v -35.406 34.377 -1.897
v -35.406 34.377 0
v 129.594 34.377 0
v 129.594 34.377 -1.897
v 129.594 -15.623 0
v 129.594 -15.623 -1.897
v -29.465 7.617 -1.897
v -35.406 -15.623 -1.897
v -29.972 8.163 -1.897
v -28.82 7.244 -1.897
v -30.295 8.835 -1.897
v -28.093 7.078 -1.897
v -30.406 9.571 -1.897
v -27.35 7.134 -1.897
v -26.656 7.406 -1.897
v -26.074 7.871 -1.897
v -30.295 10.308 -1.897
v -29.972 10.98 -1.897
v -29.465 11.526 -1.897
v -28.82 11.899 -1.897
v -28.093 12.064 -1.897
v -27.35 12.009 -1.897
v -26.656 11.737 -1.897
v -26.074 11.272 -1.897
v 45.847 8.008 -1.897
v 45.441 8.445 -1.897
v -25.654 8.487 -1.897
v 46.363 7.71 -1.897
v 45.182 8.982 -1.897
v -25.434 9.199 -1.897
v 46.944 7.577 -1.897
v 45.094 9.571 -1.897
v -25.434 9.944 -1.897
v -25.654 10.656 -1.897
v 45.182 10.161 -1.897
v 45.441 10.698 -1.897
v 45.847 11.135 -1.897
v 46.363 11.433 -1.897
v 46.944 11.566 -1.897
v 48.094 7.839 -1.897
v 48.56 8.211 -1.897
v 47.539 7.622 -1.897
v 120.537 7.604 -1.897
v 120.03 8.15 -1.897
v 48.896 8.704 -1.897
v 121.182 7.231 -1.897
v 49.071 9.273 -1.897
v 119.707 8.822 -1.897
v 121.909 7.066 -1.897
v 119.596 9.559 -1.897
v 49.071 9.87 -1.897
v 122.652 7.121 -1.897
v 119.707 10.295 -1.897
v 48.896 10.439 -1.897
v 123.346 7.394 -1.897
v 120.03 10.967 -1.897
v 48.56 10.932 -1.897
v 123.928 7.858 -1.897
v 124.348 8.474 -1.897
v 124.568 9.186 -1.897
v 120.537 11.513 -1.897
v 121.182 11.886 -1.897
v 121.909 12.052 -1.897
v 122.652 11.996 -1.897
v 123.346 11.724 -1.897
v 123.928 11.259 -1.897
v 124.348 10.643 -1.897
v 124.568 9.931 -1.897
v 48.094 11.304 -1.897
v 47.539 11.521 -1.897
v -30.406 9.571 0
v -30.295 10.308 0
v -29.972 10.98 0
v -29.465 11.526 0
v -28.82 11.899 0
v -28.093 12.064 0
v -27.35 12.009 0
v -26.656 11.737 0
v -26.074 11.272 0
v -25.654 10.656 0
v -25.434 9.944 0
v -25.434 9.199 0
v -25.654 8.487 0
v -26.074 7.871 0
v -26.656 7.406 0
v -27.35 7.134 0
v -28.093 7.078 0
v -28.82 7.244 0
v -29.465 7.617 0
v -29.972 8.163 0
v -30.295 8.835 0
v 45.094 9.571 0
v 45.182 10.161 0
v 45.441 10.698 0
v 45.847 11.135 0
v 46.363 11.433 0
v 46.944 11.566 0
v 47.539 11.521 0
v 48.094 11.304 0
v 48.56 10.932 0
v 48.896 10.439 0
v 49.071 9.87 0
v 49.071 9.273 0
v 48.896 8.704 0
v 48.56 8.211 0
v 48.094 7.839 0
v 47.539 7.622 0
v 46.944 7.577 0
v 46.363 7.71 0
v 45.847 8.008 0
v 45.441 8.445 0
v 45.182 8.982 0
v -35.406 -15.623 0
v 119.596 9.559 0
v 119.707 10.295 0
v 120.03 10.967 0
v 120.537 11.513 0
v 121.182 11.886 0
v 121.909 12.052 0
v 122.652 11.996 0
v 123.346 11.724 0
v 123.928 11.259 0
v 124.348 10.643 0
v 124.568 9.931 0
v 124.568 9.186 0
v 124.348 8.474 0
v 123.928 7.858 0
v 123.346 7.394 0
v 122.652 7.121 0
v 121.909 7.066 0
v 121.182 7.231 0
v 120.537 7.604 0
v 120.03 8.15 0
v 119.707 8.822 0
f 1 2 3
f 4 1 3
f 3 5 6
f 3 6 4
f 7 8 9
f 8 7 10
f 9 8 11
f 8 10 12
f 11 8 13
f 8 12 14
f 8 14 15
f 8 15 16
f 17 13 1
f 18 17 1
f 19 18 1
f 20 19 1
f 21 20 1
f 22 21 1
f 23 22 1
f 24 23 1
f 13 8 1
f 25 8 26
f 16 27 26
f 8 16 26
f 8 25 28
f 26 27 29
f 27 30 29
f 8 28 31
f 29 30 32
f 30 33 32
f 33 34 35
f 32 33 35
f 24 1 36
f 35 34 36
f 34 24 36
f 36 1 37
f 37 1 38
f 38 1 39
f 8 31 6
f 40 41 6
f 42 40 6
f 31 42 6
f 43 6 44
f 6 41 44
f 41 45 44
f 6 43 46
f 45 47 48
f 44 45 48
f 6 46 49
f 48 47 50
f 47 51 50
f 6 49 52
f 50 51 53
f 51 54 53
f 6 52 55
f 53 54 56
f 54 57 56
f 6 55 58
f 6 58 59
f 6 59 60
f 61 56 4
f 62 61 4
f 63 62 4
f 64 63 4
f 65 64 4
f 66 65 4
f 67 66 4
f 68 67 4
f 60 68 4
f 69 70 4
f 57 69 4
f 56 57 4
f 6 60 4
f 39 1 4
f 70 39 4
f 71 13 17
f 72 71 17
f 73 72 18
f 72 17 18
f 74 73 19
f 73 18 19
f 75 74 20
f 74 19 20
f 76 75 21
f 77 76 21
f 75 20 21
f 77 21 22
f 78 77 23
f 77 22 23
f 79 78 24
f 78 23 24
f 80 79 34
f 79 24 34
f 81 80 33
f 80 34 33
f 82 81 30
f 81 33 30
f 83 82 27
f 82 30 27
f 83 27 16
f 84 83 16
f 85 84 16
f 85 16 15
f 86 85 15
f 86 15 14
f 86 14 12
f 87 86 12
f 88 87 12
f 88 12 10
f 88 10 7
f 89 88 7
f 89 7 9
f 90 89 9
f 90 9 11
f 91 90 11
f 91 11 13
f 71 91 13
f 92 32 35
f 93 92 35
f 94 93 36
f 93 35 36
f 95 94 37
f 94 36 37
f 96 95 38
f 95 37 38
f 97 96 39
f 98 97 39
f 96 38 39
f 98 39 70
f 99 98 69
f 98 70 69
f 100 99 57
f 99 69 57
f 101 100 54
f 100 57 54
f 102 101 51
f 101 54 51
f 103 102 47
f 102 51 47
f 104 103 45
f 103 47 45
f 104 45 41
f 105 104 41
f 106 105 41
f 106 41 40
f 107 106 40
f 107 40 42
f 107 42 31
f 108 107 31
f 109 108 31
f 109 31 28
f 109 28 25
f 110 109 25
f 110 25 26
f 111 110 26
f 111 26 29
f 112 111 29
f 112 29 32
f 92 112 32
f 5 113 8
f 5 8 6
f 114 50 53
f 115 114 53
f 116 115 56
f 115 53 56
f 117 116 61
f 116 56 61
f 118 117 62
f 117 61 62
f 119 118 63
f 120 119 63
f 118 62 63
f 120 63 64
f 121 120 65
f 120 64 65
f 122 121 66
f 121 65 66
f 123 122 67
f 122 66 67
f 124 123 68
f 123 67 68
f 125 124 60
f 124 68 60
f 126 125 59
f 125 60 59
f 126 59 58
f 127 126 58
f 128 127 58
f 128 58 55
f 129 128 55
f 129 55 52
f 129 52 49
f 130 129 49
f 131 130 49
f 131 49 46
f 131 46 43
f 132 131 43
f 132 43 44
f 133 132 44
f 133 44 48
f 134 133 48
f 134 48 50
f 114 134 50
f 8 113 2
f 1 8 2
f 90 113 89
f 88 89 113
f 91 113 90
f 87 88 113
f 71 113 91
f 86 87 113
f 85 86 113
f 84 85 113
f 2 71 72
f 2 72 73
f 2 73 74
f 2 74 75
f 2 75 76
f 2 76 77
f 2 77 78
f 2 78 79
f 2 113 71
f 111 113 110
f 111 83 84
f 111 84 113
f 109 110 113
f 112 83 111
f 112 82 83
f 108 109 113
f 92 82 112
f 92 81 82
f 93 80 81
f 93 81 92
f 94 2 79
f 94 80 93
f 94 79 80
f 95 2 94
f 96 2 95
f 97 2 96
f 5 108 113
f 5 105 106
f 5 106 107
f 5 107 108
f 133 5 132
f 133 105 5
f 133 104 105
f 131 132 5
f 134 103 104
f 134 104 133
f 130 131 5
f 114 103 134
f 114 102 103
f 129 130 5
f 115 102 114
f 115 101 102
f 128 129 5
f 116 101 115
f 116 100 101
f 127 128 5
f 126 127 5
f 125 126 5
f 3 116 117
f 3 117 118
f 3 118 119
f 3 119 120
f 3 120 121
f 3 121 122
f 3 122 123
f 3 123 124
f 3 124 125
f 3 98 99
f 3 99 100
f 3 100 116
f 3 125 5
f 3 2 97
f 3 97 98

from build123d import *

# Parameters (mm, degrees)
SKETCH2_W          = 165
SKETCH2_H          = 50
BASE_FLANGE1_DEPTH = 1.89738
SKETCH7_R          = 2.5
SKETCH7_R_2        = 2
CUT_EXTRUDE1_DEPTH = 2


# Sheet-metal steps are written as plain solids
with BuildPart() as part:
    # Sketch2 → Base-Flange1 (new body)
    with BuildSketch(Plane.XY):
        with Locations((47.093573199, 9.376833926)):
            Rectangle(SKETCH2_W, SKETCH2_H)
    extrude(amount=-BASE_FLANGE1_DEPTH)

    # Sketch7 → Cut-Extrude1 (cut)
    with BuildSketch(Plane(origin=(0, 0, -1.89738), x_dir=(-1, 0, 0), z_dir=(0, 0, -1))):
        with Locations((-122.095775959, 9.558593498)):
            Circle(SKETCH7_R)
        with Locations((27.906426801, 9.571462067)):
            Circle(SKETCH7_R)
        with Locations((-47.093573199, 9.571462067)):
            Circle(SKETCH7_R_2)
    extrude(amount=-CUT_EXTRUDE1_DEPTH, mode=Mode.SUBTRACT)


solid = part.part
